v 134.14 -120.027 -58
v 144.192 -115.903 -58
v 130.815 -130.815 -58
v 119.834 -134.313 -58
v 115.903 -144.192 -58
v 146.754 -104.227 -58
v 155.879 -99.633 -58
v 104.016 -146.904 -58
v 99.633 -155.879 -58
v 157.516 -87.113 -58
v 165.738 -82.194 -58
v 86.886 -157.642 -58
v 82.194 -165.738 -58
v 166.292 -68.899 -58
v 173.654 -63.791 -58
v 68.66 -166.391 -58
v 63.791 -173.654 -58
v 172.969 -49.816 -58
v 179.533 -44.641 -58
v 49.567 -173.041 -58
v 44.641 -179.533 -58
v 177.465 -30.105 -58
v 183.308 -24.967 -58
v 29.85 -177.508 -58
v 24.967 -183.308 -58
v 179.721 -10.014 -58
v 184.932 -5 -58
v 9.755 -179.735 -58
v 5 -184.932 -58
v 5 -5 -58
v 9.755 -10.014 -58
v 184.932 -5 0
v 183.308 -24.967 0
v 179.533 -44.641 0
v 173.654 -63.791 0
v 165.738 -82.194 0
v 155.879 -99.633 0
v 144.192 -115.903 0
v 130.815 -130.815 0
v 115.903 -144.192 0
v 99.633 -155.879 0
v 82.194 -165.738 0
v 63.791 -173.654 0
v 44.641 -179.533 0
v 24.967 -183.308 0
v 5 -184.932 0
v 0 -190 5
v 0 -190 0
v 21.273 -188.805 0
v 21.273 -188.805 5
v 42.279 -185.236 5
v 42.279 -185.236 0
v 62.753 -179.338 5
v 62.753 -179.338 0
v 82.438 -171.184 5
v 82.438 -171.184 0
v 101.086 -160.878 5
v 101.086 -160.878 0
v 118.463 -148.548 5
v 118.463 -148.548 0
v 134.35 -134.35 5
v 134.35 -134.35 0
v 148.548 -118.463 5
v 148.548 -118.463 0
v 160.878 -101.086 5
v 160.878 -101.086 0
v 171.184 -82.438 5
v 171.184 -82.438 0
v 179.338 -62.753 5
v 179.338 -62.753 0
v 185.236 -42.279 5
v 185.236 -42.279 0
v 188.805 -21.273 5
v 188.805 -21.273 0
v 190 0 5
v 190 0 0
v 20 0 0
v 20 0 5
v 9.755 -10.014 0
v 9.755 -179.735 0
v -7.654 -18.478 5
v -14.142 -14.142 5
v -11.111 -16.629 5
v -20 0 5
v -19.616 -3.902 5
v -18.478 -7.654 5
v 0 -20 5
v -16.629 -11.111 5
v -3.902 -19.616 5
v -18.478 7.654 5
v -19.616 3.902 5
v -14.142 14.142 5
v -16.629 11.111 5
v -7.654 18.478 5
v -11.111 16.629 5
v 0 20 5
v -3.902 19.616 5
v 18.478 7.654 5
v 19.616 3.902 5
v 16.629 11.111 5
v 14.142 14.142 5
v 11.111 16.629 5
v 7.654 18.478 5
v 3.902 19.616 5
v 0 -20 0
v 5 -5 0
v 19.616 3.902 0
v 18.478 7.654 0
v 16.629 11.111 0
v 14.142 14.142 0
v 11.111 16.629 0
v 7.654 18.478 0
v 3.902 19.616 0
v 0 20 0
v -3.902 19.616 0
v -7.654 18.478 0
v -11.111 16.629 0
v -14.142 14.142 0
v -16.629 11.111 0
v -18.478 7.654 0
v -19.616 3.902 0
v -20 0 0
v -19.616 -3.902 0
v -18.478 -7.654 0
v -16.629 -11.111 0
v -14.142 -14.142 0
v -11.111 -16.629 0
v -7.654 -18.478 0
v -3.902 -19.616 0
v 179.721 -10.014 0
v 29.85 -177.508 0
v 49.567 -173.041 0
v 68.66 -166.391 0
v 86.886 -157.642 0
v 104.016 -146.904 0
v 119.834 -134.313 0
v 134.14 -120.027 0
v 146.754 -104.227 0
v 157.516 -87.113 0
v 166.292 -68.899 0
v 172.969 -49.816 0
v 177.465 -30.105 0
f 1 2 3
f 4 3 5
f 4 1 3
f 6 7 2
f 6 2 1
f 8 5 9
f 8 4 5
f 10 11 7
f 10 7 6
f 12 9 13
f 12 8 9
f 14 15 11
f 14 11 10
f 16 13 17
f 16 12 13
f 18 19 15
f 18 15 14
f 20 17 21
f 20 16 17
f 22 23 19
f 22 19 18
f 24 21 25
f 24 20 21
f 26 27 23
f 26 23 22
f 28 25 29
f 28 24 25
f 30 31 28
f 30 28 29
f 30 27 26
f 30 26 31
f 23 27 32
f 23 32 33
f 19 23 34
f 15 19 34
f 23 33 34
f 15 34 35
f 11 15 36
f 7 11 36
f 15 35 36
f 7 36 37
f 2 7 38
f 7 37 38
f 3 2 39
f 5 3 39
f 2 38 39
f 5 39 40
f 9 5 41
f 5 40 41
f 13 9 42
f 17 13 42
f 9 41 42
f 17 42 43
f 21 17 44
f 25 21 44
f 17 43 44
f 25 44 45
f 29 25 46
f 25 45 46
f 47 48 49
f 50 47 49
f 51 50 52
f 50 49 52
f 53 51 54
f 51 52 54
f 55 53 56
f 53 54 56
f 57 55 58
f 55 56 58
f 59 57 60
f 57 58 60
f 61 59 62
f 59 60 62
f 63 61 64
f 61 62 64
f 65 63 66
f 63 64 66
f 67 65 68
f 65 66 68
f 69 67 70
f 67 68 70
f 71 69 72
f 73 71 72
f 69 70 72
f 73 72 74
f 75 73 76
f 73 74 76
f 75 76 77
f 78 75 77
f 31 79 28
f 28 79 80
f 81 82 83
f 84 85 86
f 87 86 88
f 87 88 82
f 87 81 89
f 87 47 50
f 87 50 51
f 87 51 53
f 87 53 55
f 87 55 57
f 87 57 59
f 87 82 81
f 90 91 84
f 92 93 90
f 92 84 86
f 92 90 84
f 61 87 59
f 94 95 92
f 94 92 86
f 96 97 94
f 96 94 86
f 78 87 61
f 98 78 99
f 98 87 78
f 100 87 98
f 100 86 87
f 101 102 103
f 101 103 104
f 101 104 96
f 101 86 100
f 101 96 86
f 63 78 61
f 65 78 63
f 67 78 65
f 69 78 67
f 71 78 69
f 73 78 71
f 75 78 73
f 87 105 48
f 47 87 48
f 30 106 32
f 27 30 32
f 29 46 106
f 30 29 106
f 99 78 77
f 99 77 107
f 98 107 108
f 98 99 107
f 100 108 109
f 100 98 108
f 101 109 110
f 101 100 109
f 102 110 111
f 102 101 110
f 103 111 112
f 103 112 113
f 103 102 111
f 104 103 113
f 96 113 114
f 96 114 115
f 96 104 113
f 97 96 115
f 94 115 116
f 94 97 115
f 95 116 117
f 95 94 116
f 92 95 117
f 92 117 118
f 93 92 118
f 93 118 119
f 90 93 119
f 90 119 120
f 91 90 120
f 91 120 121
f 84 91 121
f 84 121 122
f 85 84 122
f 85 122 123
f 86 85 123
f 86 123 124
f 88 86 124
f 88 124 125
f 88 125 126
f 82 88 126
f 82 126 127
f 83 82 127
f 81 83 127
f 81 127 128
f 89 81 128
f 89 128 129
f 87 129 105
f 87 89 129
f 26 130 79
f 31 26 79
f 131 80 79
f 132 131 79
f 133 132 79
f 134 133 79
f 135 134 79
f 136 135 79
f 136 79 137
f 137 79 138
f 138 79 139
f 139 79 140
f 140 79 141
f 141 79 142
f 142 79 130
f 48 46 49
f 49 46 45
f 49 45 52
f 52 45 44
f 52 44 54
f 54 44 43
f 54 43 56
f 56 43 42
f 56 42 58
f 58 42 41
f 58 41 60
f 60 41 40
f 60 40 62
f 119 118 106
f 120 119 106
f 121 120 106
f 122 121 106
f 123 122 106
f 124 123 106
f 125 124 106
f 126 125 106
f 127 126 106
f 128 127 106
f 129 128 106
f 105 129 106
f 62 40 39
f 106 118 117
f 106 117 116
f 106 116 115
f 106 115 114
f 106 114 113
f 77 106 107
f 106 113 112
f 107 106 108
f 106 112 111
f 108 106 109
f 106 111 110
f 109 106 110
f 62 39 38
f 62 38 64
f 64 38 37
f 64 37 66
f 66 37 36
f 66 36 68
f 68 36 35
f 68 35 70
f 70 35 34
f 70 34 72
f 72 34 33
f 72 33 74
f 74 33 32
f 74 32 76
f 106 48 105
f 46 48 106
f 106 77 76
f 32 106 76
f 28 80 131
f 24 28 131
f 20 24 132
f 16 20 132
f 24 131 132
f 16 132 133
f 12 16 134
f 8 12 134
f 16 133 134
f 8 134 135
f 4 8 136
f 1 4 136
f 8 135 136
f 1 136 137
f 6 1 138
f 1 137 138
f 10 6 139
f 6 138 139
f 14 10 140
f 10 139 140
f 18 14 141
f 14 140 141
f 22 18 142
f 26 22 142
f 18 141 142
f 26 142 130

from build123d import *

# Parameters (mm, degrees)
EXTRUDE_1_DEPTH = 5
EXTRUDE_2_DEPTH = 58
SKETCH_3_R      = 20
EXTRUDE_3_DEPTH = 5


with BuildPart() as part:
    # 草图1 → 凸台-拉伸1 (new body)
    with BuildSketch(Plane.XY):
        with BuildLine():
            Line((0, 0), (0, -190))
            ThreePointArc((0, -190), (134.350288425, -134.350288425), (190, 0))
            Line((190, 0), (0, 0))
        make_face()
    extrude(amount=EXTRUDE_1_DEPTH)

    # 草图2 → 凸台-拉伸2 (add)
    with BuildSketch(Plane(origin=(0, 0, 0), x_dir=(-1, 0, 0), z_dir=(0, 0, -1))):
        with BuildLine():
            Line((-5, -5), (-184.932420089, -5))
            ThreePointArc((-184.932420089, -5), (-130.81475452, -130.81475452), (-5, -184.932420089))
            Line((-5, -184.932420089), (-5, -5))
        make_face()
        with BuildLine():
            Line((-9.755273715, -10.014049165), (-9.755273715, -179.735457367))
            ThreePointArc((-9.755273715, -179.735457367), (-127.187558429, -127.370816834), (-179.721225289, -10.014049165))
            Line((-179.721225289, -10.014049165), (-9.755273715, -10.014049165))
        make_face(mode=Mode.SUBTRACT)
    extrude(amount=EXTRUDE_2_DEPTH)

    # 草图3 → 凸台-拉伸3 (add)
    with BuildSketch(Plane.XY.offset(5)):
        Circle(SKETCH_3_R)
    extrude(amount=-EXTRUDE_3_DEPTH)


solid = part.part
